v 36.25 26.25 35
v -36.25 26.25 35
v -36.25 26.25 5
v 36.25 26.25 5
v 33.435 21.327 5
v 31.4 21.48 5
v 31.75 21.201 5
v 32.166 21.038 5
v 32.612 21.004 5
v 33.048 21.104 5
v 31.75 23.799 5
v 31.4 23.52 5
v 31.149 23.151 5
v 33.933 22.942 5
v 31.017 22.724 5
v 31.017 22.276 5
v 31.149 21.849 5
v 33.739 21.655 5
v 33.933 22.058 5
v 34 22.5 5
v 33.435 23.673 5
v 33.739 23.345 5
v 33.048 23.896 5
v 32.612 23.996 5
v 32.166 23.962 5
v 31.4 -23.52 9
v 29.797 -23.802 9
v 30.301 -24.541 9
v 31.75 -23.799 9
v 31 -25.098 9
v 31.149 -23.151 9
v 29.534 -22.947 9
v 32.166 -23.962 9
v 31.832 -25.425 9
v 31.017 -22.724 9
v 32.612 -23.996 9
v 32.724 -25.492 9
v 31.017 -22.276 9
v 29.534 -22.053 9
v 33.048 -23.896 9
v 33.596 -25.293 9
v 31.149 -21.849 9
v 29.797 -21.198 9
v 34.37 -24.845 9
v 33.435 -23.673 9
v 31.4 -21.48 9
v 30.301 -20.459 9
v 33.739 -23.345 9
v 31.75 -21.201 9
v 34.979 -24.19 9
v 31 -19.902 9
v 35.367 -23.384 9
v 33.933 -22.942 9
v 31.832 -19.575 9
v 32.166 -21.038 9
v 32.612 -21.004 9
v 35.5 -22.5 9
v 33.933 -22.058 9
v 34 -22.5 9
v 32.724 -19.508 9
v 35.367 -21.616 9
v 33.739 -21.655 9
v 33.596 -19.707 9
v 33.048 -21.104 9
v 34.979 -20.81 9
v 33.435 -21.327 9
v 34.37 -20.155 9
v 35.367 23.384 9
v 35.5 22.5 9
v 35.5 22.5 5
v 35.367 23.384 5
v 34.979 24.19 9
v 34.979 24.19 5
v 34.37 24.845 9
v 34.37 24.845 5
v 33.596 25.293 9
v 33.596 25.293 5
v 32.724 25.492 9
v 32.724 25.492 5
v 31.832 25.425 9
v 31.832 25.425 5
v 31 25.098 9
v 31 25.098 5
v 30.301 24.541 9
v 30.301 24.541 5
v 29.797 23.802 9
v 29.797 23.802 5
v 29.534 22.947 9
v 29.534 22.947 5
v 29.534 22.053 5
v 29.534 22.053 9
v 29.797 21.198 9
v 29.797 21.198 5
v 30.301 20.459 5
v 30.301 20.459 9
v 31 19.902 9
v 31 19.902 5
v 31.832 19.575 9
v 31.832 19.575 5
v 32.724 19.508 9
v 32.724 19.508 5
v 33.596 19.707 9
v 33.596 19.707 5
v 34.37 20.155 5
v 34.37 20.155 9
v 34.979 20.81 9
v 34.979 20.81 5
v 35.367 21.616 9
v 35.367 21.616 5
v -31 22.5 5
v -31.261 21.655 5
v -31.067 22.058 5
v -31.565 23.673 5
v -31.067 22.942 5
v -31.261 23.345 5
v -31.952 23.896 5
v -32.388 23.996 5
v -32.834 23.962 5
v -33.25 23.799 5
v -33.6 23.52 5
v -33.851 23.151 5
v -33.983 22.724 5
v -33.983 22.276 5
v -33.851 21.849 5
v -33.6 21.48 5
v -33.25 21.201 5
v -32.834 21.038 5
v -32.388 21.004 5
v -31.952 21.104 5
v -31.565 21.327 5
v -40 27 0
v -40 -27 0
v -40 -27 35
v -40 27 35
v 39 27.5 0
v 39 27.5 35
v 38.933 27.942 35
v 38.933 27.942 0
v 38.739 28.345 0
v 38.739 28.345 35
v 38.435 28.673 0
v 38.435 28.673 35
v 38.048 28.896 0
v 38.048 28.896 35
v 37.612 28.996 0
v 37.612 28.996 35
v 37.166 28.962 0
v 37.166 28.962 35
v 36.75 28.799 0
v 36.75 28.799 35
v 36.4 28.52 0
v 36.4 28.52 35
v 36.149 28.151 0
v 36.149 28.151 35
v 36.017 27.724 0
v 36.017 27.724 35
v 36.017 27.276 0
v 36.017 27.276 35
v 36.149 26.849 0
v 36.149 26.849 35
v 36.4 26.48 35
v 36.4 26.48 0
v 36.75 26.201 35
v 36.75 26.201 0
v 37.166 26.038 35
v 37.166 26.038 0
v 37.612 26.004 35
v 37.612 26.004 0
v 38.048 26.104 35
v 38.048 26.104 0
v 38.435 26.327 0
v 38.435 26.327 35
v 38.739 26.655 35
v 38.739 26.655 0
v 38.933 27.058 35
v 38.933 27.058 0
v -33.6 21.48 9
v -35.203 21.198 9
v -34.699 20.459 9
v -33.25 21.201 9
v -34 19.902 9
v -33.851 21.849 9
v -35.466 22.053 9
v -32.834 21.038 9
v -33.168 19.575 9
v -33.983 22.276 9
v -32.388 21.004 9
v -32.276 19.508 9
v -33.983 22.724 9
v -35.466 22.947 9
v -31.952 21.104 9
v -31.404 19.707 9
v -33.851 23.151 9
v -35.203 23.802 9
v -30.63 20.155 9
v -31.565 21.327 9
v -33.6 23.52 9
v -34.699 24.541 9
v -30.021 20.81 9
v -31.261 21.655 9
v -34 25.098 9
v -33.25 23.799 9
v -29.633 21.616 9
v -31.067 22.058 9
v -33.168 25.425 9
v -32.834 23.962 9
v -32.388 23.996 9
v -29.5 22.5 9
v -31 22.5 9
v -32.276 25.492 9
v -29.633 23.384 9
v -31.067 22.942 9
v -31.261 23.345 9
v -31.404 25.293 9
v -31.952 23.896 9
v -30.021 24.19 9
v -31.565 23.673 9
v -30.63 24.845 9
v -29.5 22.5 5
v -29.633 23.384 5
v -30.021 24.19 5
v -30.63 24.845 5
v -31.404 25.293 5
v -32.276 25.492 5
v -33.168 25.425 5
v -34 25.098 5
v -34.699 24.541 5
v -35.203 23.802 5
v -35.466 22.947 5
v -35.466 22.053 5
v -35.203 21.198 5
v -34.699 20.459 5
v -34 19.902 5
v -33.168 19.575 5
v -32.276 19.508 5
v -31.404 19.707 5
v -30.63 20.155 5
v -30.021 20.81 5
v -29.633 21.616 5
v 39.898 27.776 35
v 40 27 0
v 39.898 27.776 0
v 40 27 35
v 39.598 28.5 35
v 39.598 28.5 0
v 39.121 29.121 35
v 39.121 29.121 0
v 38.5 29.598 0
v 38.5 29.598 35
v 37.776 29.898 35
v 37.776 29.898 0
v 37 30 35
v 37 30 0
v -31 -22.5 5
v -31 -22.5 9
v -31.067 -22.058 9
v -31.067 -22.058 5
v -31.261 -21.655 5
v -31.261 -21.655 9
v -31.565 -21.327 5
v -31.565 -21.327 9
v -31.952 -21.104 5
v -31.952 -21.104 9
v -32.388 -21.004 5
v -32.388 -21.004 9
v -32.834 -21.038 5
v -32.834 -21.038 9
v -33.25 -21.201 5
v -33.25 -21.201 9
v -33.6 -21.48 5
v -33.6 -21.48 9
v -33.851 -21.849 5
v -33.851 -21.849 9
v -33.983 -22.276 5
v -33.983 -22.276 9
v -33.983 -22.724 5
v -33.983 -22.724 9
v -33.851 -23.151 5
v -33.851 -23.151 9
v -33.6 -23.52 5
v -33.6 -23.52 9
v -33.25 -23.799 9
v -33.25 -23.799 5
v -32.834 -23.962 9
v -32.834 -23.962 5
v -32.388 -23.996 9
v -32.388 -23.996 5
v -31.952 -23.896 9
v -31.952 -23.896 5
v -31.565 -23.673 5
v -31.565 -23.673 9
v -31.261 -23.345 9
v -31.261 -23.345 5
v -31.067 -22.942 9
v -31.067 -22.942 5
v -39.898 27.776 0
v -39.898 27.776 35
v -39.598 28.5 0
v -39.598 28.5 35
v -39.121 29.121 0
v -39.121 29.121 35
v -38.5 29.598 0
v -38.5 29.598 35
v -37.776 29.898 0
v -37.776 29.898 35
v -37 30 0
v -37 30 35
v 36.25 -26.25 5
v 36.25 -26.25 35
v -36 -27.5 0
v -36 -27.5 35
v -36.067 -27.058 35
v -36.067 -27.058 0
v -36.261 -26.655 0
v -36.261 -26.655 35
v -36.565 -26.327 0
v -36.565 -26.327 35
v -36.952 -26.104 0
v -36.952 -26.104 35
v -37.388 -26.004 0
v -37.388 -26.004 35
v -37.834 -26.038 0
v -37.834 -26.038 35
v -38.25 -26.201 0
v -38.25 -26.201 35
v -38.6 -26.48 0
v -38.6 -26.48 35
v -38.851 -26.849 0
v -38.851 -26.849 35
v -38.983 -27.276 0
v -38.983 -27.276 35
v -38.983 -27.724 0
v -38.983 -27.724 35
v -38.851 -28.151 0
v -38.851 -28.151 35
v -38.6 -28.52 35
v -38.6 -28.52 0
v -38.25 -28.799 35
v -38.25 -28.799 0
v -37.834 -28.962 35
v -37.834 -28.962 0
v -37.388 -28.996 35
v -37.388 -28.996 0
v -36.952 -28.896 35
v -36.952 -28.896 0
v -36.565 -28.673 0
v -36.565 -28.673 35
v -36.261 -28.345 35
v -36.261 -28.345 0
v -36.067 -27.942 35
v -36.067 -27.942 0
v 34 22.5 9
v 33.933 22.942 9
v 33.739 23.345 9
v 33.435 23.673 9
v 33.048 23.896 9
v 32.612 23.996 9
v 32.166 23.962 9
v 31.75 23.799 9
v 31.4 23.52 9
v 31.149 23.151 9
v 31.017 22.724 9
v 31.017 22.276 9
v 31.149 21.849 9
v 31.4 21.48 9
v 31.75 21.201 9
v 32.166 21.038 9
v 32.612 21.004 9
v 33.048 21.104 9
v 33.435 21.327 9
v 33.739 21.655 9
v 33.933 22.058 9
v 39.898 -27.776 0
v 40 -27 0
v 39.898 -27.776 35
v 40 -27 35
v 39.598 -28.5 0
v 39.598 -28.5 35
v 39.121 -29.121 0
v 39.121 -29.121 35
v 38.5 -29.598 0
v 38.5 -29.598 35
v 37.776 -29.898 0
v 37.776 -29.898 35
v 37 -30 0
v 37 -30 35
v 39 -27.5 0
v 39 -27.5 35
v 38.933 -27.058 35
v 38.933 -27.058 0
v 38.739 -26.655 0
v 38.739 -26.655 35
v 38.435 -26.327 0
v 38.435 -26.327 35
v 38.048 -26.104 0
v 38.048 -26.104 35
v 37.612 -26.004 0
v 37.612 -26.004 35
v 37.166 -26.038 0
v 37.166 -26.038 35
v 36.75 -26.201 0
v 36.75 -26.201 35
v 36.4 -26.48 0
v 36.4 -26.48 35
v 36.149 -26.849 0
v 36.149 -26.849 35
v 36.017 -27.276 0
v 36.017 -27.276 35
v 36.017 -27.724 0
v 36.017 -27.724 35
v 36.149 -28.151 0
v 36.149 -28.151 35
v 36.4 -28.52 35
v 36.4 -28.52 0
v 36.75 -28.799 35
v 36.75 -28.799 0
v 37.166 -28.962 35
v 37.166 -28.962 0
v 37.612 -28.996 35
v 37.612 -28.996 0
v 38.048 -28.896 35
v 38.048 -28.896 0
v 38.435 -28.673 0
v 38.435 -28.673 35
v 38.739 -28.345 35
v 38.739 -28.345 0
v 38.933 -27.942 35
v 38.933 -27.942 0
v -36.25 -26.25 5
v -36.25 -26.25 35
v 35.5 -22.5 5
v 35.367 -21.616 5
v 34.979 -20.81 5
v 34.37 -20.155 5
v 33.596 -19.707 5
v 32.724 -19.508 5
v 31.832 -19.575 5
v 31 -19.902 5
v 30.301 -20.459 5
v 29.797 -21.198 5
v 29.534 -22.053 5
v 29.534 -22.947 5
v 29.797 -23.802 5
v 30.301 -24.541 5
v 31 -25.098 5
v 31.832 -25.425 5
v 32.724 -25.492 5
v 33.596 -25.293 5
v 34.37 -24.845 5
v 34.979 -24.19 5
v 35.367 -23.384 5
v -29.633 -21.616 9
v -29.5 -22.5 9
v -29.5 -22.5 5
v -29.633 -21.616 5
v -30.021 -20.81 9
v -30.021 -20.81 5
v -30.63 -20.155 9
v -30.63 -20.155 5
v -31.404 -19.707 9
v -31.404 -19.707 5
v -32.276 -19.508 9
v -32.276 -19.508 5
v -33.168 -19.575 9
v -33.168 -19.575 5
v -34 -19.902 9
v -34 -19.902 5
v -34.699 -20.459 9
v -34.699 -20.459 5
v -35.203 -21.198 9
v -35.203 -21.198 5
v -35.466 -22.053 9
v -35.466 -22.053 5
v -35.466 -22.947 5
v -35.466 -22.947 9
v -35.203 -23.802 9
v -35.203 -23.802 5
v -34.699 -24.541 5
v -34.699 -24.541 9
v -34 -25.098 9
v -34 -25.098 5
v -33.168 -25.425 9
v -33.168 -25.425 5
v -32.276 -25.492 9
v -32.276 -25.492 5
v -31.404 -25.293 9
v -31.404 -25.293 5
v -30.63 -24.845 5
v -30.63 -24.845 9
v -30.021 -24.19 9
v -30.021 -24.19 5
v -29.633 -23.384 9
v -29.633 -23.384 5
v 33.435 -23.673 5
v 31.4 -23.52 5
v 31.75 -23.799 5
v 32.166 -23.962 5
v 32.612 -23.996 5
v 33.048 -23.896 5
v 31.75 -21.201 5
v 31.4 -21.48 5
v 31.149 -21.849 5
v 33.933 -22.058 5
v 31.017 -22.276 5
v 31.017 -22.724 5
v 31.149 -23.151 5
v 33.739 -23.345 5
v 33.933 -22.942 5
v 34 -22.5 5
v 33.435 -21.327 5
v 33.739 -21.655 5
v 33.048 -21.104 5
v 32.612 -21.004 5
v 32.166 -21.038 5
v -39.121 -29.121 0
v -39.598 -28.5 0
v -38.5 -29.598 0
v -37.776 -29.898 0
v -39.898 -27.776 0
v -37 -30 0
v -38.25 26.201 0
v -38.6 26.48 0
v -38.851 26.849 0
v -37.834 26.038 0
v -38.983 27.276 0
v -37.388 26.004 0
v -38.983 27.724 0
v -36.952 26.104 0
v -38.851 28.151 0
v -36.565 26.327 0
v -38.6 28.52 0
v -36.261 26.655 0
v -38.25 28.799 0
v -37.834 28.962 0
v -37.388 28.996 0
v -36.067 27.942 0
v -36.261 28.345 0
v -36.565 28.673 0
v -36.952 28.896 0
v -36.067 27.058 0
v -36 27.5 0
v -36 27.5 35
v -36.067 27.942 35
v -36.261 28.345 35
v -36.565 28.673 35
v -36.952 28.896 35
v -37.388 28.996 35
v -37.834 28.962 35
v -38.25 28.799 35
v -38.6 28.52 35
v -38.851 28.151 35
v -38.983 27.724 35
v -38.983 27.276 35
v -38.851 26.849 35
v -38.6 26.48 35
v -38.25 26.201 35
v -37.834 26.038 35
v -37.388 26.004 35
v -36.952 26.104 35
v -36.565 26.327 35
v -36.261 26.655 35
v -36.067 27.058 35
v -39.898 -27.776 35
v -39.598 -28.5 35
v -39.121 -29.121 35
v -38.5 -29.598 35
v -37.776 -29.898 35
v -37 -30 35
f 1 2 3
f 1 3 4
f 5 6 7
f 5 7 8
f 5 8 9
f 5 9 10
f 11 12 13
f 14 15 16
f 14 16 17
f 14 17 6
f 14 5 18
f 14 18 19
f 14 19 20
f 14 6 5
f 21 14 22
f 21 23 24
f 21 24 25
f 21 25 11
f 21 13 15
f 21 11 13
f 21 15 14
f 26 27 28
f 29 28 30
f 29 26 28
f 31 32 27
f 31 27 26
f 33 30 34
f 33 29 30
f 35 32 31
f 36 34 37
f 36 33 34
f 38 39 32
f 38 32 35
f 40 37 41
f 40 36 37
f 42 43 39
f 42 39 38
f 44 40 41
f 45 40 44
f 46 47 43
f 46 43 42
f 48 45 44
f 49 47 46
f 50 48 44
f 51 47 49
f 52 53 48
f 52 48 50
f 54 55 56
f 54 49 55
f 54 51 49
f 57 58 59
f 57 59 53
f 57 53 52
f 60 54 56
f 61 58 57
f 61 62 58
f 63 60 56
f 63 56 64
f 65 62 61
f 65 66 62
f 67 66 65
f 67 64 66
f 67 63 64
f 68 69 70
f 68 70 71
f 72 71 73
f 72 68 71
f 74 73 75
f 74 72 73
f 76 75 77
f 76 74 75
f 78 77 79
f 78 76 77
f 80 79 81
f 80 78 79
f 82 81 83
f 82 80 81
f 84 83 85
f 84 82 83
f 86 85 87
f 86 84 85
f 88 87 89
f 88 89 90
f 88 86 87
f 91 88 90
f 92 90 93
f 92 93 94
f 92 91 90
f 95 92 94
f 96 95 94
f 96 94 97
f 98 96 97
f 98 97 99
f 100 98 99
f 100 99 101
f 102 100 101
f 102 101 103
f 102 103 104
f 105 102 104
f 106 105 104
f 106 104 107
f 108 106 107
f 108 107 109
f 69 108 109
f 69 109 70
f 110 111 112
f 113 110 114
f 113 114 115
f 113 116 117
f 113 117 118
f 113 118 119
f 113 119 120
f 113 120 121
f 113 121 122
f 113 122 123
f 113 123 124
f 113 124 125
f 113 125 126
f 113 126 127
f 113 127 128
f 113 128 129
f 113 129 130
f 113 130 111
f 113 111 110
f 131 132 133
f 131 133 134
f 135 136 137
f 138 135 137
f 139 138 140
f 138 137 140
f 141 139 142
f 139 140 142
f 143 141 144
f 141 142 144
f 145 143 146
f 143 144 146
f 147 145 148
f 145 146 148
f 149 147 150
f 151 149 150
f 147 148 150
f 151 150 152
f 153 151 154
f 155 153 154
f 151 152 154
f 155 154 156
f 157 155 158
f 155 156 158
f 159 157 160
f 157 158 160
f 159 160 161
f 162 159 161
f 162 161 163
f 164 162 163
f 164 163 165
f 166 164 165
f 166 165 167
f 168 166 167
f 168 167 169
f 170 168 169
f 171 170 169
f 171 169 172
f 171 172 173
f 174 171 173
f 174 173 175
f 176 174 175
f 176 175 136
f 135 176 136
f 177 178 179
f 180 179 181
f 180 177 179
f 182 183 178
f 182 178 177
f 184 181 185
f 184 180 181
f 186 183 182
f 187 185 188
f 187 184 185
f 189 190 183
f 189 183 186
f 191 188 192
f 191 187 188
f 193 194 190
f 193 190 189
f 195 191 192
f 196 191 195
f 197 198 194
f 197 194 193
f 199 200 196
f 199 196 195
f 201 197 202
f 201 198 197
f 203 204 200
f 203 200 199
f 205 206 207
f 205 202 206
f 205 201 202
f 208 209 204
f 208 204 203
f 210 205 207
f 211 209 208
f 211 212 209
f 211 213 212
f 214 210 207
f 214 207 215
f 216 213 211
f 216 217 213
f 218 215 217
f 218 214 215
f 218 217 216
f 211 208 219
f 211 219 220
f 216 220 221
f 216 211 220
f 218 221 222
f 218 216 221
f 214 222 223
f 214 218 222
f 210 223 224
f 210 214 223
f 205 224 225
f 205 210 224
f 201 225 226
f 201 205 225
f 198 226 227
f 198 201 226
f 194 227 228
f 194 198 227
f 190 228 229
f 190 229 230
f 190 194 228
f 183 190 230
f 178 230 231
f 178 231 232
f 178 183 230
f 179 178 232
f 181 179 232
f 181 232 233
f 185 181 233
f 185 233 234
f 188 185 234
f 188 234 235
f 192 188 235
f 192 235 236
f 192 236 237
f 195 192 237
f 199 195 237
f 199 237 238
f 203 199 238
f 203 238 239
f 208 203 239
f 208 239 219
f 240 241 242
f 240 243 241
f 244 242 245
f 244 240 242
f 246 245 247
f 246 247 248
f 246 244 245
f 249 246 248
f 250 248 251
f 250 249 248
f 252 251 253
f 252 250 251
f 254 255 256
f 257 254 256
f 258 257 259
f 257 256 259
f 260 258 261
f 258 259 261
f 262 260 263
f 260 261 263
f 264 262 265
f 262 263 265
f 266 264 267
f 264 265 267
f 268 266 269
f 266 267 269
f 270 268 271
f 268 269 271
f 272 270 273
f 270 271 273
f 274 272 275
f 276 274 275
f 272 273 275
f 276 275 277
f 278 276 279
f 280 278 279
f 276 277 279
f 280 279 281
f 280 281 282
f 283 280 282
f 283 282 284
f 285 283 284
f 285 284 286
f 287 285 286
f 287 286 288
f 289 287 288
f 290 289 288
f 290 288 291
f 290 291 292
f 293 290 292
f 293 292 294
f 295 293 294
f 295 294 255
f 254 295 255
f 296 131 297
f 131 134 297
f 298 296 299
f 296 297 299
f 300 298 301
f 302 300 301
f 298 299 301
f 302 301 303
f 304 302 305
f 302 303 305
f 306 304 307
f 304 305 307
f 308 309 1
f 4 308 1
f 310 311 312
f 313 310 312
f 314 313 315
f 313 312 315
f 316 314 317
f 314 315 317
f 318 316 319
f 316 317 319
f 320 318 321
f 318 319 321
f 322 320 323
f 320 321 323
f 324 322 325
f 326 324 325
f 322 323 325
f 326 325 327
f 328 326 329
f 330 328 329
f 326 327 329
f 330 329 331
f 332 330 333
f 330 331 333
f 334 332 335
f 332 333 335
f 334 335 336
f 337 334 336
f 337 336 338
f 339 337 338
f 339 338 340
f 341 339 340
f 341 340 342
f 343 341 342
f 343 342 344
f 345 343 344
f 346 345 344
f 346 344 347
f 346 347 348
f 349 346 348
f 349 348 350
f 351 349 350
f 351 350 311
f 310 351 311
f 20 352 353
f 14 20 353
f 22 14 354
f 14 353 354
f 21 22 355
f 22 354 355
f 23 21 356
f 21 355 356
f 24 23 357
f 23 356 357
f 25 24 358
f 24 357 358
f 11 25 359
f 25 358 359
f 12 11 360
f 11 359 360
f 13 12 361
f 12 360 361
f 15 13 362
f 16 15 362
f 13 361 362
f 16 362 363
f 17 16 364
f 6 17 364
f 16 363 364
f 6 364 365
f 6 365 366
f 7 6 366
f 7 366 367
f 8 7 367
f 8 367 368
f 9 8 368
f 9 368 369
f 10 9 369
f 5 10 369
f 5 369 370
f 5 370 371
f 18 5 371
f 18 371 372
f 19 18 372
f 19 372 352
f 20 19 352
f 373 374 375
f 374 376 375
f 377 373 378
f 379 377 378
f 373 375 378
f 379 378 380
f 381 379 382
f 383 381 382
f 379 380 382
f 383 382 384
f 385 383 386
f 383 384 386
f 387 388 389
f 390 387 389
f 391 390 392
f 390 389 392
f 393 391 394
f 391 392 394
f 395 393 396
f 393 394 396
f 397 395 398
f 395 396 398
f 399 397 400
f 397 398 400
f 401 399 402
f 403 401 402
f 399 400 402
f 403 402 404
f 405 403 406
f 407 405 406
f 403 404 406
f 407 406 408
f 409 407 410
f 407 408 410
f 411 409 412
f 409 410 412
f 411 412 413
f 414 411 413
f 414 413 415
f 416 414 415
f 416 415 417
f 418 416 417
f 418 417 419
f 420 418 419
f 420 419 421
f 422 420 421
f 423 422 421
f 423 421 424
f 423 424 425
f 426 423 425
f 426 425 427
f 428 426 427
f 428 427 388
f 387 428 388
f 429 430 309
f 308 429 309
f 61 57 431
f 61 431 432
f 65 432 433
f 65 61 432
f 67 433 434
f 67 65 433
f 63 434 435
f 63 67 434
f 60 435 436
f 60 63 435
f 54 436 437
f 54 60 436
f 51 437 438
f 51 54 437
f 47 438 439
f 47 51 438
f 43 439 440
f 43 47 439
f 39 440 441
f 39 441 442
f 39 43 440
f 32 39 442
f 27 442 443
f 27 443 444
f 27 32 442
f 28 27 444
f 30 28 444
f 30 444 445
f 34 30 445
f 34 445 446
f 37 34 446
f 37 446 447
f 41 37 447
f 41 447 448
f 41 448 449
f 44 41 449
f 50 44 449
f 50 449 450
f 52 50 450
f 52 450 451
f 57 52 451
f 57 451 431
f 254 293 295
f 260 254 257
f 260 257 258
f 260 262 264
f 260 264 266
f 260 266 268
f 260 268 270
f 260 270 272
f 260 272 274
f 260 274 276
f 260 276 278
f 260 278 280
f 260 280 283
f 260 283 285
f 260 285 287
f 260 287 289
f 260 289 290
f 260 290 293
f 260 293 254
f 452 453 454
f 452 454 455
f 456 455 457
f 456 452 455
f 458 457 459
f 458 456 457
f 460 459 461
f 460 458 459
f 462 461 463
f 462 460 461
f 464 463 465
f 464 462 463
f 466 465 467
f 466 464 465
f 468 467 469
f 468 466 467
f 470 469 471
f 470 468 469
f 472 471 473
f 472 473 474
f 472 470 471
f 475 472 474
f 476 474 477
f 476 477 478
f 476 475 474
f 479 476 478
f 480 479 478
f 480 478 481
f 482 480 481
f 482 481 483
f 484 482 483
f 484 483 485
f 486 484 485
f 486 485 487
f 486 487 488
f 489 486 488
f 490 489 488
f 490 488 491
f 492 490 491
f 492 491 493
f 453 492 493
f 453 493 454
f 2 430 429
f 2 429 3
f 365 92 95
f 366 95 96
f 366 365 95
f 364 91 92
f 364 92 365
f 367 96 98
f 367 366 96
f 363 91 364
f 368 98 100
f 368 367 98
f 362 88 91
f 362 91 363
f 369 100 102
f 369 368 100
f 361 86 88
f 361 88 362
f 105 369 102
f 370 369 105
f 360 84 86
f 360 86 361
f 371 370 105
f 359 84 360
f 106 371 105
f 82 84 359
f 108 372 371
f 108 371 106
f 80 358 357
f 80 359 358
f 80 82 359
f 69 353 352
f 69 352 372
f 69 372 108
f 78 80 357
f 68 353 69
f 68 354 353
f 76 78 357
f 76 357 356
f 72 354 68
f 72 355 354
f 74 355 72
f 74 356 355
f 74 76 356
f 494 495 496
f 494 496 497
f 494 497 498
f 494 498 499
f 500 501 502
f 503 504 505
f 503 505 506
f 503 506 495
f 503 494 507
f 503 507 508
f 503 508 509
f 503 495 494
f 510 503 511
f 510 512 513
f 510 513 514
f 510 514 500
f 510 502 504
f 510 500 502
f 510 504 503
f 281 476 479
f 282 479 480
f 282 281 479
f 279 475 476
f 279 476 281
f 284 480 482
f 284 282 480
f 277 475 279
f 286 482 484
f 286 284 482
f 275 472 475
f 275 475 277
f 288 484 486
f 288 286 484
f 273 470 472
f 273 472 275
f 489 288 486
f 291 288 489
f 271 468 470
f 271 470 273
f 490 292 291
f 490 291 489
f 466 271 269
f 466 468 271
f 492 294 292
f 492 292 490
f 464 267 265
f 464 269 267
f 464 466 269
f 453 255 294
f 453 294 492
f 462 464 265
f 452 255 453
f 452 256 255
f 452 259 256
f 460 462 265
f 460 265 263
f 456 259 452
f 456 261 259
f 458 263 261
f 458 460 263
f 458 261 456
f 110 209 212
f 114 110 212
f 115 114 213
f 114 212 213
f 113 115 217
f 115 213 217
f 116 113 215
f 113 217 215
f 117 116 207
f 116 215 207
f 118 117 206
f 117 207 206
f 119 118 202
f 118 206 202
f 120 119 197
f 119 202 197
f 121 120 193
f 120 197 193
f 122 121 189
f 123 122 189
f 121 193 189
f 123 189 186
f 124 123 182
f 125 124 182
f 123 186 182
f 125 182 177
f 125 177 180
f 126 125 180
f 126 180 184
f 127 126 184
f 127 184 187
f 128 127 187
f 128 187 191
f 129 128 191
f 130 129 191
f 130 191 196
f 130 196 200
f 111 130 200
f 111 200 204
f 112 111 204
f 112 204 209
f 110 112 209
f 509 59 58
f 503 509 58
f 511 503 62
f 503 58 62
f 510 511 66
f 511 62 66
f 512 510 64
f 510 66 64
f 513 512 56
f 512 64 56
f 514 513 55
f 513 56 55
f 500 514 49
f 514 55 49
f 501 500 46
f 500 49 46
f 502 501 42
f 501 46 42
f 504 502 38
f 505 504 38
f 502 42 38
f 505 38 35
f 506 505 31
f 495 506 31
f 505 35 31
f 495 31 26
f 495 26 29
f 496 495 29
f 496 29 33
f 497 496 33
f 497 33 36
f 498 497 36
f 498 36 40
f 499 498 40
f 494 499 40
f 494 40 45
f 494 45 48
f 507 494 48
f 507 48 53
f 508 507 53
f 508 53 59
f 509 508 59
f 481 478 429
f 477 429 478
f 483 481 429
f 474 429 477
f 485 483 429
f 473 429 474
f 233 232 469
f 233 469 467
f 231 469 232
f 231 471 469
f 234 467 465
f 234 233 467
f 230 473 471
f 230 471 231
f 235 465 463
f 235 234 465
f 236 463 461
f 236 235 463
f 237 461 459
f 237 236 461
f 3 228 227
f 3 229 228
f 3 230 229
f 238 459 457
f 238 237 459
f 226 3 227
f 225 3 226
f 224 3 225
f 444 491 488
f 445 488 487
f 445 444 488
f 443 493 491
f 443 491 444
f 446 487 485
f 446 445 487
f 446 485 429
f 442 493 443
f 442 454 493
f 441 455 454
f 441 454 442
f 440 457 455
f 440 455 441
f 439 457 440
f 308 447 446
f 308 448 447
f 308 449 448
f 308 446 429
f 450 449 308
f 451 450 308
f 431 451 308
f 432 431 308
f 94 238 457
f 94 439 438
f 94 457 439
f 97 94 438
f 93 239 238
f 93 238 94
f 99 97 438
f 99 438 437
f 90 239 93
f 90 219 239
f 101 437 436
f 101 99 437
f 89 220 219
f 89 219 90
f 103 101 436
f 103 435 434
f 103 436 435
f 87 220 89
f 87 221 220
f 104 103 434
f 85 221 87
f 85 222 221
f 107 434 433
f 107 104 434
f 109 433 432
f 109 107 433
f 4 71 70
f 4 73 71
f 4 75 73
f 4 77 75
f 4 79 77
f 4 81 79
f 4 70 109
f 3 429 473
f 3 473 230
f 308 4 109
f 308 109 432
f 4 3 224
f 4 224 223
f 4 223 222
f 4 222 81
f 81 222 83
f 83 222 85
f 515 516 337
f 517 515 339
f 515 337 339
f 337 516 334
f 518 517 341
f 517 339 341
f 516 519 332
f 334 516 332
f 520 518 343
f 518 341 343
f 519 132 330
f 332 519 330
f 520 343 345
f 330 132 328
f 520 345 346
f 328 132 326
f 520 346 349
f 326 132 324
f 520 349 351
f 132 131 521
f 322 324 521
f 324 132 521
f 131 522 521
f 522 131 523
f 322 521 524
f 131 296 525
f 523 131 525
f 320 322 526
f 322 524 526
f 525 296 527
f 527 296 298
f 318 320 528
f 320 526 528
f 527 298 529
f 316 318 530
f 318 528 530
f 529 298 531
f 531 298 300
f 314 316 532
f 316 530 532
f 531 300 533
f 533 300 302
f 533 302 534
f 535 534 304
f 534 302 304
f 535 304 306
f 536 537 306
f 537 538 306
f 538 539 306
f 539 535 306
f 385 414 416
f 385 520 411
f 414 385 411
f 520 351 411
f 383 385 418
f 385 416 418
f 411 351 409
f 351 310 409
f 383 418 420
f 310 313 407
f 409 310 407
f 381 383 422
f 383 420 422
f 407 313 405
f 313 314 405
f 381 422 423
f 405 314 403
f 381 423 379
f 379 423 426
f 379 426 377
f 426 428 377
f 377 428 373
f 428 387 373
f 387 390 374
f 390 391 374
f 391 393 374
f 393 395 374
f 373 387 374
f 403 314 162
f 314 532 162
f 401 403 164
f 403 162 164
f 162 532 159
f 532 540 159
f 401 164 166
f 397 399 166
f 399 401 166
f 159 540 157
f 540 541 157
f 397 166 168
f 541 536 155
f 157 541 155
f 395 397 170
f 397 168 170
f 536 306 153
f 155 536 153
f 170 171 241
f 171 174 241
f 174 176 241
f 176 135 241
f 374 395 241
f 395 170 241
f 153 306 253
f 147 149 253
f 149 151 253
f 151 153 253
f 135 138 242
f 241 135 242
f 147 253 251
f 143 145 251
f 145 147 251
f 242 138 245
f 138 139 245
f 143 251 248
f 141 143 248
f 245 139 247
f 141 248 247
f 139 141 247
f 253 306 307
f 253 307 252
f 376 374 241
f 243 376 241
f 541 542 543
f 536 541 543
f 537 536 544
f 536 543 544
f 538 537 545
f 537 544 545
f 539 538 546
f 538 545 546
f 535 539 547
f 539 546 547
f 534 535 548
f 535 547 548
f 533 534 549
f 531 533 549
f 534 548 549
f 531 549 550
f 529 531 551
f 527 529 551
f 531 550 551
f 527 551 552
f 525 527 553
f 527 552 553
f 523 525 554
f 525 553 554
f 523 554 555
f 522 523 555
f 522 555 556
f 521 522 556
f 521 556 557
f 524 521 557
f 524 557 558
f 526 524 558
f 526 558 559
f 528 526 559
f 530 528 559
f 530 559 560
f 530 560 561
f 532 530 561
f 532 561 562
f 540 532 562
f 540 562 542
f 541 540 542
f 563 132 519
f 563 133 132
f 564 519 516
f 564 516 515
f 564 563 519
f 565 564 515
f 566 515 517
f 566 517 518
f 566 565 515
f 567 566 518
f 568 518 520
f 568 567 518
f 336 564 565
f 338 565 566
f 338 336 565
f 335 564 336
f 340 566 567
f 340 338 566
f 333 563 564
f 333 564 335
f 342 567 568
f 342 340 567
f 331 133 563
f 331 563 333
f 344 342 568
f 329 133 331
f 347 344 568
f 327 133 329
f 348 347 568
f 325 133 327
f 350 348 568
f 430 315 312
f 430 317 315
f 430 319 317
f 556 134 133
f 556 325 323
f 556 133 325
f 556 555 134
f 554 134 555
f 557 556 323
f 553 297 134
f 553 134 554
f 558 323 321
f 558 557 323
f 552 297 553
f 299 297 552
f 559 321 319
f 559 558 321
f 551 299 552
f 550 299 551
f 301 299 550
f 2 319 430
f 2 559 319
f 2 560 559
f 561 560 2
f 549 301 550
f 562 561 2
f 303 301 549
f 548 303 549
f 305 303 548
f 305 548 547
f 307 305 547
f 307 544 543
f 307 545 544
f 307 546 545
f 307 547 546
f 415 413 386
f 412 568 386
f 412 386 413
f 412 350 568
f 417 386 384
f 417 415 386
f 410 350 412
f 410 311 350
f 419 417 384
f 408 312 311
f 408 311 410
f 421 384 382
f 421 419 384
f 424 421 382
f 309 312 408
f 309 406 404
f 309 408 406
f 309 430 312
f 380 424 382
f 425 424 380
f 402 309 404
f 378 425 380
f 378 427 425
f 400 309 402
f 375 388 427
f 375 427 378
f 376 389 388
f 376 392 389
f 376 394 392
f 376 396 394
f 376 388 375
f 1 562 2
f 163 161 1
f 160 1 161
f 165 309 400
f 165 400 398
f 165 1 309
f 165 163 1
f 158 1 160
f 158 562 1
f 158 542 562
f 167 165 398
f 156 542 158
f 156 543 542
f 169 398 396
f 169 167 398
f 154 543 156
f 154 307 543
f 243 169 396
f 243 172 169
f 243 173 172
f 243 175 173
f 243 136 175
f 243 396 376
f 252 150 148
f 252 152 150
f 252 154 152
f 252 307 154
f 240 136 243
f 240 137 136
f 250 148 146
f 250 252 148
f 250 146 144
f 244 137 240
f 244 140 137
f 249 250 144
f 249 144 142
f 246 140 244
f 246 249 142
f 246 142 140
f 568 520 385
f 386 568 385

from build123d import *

# Parameters (mm, degrees)
SKETCH_W        = 80
SKETCH_H        = 60
PAD_DEPTH       = 35
SKETCH001_W     = 72.5
SKETCH001_H     = 52.5
SKETCH001_R     = 3
SKETCH001_R_2   = 1.5
POCKET_DEPTH    = 30
SKETCH002_R     = 1.5
POCKET001_DEPTH = 35.001
SKETCH003_W     = 72.5
SKETCH003_H     = 52.5
POCKET002_DEPTH = 26
FILLET_R        = 3


with BuildPart() as part:
    # Sketch → Pad (new body)
    with BuildSketch(Plane.XY):
        Rectangle(SKETCH_W, SKETCH_H)
    extrude(amount=PAD_DEPTH)

    # Sketch001 (on DatumPlane) → Pocket (cut)
    with BuildSketch(Plane.XY.offset(35)):
        Rectangle(SKETCH001_W, SKETCH001_H)
        with Locations((-32.5, 22.5)):
            Circle(SKETCH001_R, mode=Mode.SUBTRACT)
        with Locations((32.5, 22.5)):
            Circle(SKETCH001_R, mode=Mode.SUBTRACT)
        with Locations((32.5, -22.5)):
            Circle(SKETCH001_R, mode=Mode.SUBTRACT)
        with Locations((-32.5, -22.5)):
            Circle(SKETCH001_R, mode=Mode.SUBTRACT)
        with Locations((-32.5, 22.5)):
            Circle(SKETCH001_R_2)
        with Locations((32.5, 22.5)):
            Circle(SKETCH001_R_2)
        with Locations((32.5, -22.5)):
            Circle(SKETCH001_R_2)
        with Locations((-32.5, -22.5)):
            Circle(SKETCH001_R_2)
    extrude(amount=-POCKET_DEPTH, mode=Mode.SUBTRACT)

    # Sketch002 (on DatumPlane) → Pocket001 (cut, through all)
    with BuildSketch(Plane.XY.offset(35)):
        with Locations((37.5, -27.5)):
            Circle(SKETCH002_R)
        with Locations((37.5, 27.5)):
            Circle(SKETCH002_R)
        with Locations((-37.5, 27.5)):
            Circle(SKETCH002_R)
        with Locations((-37.5, -27.5)):
            Circle(SKETCH002_R)
    extrude(amount=-POCKET001_DEPTH, mode=Mode.SUBTRACT)

    # Sketch003 (on DatumPlane) → Pocket002 (cut)
    with BuildSketch(Plane.XY.offset(35)):
        Rectangle(SKETCH003_W, SKETCH003_H)
    extrude(amount=-POCKET002_DEPTH, mode=Mode.SUBTRACT)

    # Fillet
    fillet_edges = [part.edges().sort_by_distance(p)[0] for p in [
        (-40, -30, 17.5),
        (40, -30, 17.5),
        (40, 30, 17.5),
        (-40, 30, 17.5),
    ]]
    fillet(fillet_edges, radius=FILLET_R)


solid = part.part
